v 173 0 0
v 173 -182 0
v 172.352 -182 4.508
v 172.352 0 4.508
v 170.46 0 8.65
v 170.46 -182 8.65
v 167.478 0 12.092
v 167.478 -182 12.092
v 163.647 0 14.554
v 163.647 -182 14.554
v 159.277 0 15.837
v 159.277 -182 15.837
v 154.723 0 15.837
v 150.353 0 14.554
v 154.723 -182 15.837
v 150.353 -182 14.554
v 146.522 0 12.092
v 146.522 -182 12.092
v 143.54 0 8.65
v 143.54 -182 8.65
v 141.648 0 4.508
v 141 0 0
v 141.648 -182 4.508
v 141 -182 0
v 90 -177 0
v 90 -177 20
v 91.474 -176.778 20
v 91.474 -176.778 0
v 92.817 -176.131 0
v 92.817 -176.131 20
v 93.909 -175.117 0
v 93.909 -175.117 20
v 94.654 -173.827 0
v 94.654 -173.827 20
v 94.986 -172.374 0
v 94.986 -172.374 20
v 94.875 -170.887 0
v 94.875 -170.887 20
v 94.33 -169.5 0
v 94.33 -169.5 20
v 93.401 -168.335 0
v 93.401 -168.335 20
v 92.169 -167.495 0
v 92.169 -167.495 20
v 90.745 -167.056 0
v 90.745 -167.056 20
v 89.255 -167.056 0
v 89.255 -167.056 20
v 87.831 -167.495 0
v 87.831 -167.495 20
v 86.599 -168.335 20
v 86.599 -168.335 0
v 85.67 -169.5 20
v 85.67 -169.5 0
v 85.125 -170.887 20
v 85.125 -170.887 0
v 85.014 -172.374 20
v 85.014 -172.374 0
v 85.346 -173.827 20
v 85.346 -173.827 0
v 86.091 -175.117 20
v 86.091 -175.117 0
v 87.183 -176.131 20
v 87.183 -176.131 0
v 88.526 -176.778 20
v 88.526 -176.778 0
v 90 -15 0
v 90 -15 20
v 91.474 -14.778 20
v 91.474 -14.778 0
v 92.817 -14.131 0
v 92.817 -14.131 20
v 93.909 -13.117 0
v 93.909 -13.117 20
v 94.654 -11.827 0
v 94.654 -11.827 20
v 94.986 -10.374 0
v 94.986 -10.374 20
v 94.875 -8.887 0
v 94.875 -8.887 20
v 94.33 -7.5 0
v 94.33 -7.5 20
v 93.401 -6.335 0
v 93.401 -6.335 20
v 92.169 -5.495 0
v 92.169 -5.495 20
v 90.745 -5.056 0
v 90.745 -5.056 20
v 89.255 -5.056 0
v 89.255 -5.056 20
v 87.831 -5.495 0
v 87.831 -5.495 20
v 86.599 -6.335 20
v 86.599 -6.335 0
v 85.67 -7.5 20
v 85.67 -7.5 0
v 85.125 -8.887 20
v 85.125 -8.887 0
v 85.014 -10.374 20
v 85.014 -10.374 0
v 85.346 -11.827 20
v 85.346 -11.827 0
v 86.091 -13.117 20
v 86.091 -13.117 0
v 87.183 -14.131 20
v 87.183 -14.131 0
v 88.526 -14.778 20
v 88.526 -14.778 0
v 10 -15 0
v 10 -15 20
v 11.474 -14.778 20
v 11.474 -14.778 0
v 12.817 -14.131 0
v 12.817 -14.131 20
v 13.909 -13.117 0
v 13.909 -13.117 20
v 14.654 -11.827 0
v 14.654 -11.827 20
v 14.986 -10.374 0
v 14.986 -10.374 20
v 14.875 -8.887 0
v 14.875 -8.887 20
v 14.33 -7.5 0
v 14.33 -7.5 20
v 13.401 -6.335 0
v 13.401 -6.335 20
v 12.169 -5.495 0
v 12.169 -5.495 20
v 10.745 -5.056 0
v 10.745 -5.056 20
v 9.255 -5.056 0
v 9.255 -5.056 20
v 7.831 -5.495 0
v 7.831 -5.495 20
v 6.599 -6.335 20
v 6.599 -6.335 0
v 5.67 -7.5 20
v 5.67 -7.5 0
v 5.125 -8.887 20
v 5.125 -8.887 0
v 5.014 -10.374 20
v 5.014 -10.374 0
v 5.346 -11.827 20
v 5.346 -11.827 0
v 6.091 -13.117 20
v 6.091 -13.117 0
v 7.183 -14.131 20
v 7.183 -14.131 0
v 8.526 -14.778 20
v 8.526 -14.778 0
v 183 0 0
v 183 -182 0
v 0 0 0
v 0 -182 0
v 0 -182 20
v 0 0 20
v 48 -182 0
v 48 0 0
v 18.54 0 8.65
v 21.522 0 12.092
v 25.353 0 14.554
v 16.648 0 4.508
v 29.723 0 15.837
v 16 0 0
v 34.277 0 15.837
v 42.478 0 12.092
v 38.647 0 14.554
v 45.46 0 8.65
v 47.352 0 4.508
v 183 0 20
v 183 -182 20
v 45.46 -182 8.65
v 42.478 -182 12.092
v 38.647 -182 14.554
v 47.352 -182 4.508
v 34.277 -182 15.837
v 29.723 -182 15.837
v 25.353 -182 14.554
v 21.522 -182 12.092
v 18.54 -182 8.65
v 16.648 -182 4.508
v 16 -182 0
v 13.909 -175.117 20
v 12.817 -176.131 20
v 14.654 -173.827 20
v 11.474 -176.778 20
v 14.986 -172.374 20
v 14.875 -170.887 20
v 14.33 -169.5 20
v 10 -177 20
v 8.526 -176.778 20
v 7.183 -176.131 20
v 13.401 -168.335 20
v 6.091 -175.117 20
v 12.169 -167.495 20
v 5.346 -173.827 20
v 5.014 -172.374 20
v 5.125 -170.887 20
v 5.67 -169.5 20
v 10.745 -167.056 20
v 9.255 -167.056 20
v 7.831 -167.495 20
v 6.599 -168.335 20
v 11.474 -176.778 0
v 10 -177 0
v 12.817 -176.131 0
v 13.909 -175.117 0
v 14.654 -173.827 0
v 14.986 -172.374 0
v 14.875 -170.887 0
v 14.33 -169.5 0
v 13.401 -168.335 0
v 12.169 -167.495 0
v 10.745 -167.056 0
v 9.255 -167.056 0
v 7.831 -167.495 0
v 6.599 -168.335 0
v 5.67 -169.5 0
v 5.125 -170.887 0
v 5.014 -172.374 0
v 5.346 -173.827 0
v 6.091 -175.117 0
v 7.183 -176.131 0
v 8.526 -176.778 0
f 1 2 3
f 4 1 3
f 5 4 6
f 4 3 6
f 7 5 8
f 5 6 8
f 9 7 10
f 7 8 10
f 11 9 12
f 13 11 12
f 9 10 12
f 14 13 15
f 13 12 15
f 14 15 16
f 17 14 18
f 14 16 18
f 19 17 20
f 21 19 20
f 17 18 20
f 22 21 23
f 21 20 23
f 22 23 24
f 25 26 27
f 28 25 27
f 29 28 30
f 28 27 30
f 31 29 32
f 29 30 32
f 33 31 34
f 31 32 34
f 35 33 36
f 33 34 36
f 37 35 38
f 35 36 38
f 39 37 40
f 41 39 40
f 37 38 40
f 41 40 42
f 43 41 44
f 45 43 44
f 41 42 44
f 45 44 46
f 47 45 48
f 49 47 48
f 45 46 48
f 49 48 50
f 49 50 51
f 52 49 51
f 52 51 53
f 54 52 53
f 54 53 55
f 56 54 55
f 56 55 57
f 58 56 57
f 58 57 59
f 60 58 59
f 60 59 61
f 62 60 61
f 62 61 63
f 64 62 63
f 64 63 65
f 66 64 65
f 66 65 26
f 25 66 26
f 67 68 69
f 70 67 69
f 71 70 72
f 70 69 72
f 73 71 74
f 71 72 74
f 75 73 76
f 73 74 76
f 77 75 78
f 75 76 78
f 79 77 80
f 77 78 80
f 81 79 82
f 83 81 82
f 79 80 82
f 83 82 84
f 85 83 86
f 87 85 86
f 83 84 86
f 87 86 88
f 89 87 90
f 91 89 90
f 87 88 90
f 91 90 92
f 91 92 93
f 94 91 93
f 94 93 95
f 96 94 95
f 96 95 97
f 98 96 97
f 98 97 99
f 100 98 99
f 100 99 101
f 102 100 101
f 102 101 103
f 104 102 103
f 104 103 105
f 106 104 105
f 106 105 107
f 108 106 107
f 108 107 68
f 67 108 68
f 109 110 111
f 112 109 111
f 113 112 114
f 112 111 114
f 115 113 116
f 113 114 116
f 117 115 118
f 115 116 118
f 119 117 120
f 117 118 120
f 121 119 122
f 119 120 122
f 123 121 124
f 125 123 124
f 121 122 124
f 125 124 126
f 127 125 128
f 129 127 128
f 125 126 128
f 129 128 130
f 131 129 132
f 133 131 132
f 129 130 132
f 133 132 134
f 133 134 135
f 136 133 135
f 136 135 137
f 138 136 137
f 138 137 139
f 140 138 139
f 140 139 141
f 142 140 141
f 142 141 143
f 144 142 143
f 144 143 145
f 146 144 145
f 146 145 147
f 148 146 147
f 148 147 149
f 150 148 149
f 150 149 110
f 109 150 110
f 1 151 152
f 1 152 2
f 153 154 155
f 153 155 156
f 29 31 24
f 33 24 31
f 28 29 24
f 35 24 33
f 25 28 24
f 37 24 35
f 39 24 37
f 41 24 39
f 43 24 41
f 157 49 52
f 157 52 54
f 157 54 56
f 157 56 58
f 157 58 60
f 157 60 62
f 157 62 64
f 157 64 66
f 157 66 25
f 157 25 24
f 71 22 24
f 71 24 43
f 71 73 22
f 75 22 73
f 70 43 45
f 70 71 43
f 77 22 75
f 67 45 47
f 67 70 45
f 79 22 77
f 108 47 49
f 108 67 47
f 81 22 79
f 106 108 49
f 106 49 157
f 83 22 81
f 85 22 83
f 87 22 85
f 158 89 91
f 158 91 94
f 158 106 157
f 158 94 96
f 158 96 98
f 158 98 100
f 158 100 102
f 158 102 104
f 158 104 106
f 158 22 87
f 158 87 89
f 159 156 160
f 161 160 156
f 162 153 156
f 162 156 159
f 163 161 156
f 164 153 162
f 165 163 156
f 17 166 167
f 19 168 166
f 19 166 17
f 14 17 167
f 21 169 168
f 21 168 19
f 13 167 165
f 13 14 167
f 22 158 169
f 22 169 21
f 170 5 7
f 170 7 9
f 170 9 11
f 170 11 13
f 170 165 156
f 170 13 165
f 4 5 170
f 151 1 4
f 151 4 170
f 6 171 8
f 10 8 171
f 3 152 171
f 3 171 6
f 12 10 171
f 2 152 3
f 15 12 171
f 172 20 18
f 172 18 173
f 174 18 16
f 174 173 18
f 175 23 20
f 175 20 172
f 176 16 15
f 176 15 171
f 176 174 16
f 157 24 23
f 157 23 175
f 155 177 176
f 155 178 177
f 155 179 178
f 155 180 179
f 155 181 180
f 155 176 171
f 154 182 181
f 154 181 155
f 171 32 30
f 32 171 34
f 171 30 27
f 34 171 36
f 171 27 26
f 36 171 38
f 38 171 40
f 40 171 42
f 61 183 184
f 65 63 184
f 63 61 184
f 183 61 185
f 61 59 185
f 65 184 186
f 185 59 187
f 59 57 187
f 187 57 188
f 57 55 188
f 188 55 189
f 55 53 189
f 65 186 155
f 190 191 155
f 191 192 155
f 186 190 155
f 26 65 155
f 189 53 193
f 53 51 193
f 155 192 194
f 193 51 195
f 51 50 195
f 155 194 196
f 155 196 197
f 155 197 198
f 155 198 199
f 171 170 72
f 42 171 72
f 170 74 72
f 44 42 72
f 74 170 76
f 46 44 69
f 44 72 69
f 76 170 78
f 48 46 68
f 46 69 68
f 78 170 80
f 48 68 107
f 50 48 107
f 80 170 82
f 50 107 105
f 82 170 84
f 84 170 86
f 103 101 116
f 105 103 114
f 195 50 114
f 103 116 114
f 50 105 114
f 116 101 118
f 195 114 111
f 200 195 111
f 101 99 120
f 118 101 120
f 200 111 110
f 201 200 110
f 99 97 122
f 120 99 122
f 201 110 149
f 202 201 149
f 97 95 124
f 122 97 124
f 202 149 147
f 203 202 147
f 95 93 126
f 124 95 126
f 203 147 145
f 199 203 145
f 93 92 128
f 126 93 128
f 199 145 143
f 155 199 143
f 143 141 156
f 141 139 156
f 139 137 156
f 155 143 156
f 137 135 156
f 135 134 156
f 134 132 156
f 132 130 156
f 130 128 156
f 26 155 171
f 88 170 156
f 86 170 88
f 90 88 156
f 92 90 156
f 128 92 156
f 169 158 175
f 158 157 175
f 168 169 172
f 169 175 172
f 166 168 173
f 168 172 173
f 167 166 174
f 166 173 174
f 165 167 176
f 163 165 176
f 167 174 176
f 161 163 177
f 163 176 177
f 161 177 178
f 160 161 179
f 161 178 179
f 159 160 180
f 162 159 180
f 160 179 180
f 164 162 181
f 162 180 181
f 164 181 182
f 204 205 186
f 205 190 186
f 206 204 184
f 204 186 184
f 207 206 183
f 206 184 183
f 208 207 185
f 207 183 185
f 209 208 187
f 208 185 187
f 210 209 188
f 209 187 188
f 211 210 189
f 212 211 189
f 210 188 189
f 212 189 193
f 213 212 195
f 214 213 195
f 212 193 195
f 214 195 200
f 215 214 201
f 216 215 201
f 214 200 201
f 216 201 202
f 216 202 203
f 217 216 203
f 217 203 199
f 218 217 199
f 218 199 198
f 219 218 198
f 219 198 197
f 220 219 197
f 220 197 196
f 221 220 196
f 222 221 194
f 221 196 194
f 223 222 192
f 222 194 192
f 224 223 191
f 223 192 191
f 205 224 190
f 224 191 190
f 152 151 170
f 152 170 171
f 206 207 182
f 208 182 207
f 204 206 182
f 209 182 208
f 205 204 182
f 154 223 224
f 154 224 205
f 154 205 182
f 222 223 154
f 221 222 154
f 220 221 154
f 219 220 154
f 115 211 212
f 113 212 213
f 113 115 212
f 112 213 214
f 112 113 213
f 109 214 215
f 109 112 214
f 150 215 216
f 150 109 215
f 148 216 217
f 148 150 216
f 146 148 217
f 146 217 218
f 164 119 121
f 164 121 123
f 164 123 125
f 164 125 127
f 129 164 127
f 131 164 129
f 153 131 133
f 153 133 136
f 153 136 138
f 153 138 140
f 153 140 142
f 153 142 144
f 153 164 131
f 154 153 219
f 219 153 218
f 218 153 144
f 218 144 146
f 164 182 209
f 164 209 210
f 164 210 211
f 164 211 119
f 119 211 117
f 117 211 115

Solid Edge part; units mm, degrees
sketch "Sketch1" plane through (0, 0, 0) normal (0, 0, 1) x (1, 0, 0)
  line L0 (183, -182) -> (0, -182)
  line L1 (0, -182) -> (0, 0)
  line L2 (0, 0) -> (183, 0)
  line L3 (183, 0) -> (183, -182)
  dimension "D1" = 182
  dimension "D2" = 183
extrude "Protrusion1" add sketch "Sketch1" along normal blind 20
sketch "Sketch2" plane through (91.5, -182, 10) normal (0, -1, 0) x (1, 0, 0)
  circle A0 centre (-59.5, -10) radius 16
  circle A1 centre (65.5, -10) radius 16
  dimension "D1" = 32
  dimension "D2" = 32
  dimension "D3" = 125
extrude "Cutout1" cut sketch "Sketch2" against normal through all
hole "Hole1" at (10, -172, 20) direction (0, 0, -1) diameter 10 end up to next
hole "Hole2" at (90, -172, 20) direction (0, 0, -1) diameter 10 end up to next
hole "Hole3" at (90, -10, 20) direction (0, 0, -1) diameter 10 end up to next
hole "Hole4" at (10, -10, 20) direction (0, 0, -1) diameter 10 end up to next
